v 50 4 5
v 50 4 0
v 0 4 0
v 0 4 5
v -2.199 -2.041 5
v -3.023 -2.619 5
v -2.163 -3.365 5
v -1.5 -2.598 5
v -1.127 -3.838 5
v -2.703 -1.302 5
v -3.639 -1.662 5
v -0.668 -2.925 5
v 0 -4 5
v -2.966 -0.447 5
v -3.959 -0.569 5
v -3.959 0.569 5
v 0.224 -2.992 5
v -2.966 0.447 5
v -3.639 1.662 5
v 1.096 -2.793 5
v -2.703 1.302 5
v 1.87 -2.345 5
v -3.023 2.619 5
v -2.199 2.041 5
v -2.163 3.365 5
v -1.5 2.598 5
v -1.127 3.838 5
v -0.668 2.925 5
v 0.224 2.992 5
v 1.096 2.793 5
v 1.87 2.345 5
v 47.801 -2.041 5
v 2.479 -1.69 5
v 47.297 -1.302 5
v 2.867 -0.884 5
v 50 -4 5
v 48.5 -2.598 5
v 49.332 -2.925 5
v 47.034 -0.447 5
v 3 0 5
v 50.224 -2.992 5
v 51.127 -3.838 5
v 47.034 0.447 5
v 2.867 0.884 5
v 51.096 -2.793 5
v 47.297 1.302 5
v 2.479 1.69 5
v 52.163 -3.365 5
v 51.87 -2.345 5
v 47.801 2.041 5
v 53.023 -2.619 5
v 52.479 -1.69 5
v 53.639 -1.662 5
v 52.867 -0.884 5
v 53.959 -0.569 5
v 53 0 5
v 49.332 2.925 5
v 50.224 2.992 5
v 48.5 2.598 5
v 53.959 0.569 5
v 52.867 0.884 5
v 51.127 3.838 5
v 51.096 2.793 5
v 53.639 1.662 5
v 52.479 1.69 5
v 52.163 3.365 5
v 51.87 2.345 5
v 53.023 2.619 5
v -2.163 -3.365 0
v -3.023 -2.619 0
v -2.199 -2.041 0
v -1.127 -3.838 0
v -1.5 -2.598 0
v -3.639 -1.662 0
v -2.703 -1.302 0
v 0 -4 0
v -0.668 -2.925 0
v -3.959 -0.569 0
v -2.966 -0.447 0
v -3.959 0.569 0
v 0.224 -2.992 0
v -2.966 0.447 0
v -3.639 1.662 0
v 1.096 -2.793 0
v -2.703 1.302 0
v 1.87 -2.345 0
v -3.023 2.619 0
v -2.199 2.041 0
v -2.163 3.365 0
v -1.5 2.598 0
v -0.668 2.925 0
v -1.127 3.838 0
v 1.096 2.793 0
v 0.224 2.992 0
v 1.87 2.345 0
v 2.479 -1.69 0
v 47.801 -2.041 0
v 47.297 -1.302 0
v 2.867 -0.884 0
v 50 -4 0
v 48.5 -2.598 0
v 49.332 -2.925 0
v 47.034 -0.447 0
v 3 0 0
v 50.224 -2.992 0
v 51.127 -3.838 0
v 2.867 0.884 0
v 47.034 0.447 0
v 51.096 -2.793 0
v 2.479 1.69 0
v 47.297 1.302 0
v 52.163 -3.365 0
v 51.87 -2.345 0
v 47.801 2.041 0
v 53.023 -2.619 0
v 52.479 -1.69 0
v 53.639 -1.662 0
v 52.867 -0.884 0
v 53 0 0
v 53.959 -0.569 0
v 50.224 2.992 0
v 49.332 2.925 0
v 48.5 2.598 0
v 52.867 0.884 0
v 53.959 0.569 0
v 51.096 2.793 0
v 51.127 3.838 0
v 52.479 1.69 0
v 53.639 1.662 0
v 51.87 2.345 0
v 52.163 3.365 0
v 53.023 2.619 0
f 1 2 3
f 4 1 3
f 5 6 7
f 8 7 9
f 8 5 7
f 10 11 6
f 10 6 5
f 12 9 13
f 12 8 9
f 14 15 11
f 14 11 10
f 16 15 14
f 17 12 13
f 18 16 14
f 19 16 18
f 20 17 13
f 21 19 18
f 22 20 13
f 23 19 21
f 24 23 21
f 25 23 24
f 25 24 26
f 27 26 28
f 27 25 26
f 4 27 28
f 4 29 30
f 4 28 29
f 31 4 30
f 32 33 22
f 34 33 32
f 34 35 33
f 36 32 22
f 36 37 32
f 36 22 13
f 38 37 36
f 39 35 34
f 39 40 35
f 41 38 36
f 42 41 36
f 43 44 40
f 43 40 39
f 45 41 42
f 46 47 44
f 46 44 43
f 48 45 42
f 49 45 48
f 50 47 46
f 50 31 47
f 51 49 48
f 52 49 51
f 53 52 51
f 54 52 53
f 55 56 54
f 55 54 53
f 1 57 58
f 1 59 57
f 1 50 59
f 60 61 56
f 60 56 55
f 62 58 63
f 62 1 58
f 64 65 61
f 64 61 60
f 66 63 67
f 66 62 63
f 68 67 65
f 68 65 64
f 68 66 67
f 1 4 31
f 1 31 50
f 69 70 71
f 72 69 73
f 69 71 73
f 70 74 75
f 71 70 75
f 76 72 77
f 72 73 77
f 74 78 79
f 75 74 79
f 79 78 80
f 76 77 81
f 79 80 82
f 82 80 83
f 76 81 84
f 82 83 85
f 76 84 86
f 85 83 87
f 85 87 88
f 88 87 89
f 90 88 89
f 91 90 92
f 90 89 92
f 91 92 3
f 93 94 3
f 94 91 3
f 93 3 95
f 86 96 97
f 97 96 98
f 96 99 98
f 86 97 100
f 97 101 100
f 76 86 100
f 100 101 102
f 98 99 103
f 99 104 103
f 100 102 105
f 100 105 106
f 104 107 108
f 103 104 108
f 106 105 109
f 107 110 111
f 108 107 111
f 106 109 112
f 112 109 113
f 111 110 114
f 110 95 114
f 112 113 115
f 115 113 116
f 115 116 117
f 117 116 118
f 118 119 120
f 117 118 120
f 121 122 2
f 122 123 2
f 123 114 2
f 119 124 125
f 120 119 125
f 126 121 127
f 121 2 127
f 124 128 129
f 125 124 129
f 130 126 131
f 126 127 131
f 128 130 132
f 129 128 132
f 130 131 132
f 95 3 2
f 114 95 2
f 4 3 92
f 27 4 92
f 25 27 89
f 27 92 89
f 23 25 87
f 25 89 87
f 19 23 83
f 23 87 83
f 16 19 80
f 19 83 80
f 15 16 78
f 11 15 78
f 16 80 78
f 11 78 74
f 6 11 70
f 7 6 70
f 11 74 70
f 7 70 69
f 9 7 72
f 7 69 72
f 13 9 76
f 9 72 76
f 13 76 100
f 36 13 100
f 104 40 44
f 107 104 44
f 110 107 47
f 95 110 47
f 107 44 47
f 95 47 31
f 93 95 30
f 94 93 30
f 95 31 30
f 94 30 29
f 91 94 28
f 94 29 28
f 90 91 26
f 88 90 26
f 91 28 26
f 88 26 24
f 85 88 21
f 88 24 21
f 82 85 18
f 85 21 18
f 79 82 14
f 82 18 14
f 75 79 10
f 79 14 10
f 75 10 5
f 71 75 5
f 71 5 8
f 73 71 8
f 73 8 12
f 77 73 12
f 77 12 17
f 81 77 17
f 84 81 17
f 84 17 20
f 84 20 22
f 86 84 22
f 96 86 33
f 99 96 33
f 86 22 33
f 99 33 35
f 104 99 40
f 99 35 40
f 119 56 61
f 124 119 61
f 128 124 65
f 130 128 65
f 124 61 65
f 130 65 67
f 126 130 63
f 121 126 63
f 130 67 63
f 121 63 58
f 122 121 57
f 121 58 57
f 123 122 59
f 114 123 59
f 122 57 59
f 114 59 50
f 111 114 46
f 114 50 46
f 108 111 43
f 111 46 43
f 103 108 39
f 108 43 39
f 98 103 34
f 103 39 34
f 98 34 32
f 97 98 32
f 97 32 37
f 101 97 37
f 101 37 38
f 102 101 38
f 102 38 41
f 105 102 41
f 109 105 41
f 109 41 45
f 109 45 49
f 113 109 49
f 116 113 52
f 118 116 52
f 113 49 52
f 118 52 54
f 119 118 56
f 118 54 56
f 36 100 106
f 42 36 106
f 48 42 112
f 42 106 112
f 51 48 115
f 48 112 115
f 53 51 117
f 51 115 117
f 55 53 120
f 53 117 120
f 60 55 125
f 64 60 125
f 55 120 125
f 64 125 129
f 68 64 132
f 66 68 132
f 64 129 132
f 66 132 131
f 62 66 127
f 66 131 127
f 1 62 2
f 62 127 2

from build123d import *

# Parameters (mm, degrees)
F1_DEPTH = 5
F2_R     = 3
F3_DEPTH = 5
F4_R     = 3
F5_DEPTH = 5


with BuildPart() as f1:
    # F0 (on Top) → F1 (new body)
    with BuildSketch(Plane.XY):
        with BuildLine():
            ThreePointArc((0, 4), (-4, 0), (0, -4))
            Line((0, -4), (50, -4))
            ThreePointArc((50, -4), (54, 0), (50, 4))
            Line((50, 4), (0, 4))
        make_face()
    extrude(amount=F1_DEPTH)

    # F2 (on face) → F3 (cut, through all)
    with BuildSketch(Plane.XY.offset(5)):
        Circle(F2_R)
    extrude(amount=-F3_DEPTH, mode=Mode.SUBTRACT)

    # F4 (on face) → F5 (cut, through all)
    with BuildSketch(Plane.XY.offset(5)):
        with Locations((50, 0)):
            Circle(F4_R)
    extrude(amount=-F5_DEPTH, mode=Mode.SUBTRACT)


solid = f1.part
